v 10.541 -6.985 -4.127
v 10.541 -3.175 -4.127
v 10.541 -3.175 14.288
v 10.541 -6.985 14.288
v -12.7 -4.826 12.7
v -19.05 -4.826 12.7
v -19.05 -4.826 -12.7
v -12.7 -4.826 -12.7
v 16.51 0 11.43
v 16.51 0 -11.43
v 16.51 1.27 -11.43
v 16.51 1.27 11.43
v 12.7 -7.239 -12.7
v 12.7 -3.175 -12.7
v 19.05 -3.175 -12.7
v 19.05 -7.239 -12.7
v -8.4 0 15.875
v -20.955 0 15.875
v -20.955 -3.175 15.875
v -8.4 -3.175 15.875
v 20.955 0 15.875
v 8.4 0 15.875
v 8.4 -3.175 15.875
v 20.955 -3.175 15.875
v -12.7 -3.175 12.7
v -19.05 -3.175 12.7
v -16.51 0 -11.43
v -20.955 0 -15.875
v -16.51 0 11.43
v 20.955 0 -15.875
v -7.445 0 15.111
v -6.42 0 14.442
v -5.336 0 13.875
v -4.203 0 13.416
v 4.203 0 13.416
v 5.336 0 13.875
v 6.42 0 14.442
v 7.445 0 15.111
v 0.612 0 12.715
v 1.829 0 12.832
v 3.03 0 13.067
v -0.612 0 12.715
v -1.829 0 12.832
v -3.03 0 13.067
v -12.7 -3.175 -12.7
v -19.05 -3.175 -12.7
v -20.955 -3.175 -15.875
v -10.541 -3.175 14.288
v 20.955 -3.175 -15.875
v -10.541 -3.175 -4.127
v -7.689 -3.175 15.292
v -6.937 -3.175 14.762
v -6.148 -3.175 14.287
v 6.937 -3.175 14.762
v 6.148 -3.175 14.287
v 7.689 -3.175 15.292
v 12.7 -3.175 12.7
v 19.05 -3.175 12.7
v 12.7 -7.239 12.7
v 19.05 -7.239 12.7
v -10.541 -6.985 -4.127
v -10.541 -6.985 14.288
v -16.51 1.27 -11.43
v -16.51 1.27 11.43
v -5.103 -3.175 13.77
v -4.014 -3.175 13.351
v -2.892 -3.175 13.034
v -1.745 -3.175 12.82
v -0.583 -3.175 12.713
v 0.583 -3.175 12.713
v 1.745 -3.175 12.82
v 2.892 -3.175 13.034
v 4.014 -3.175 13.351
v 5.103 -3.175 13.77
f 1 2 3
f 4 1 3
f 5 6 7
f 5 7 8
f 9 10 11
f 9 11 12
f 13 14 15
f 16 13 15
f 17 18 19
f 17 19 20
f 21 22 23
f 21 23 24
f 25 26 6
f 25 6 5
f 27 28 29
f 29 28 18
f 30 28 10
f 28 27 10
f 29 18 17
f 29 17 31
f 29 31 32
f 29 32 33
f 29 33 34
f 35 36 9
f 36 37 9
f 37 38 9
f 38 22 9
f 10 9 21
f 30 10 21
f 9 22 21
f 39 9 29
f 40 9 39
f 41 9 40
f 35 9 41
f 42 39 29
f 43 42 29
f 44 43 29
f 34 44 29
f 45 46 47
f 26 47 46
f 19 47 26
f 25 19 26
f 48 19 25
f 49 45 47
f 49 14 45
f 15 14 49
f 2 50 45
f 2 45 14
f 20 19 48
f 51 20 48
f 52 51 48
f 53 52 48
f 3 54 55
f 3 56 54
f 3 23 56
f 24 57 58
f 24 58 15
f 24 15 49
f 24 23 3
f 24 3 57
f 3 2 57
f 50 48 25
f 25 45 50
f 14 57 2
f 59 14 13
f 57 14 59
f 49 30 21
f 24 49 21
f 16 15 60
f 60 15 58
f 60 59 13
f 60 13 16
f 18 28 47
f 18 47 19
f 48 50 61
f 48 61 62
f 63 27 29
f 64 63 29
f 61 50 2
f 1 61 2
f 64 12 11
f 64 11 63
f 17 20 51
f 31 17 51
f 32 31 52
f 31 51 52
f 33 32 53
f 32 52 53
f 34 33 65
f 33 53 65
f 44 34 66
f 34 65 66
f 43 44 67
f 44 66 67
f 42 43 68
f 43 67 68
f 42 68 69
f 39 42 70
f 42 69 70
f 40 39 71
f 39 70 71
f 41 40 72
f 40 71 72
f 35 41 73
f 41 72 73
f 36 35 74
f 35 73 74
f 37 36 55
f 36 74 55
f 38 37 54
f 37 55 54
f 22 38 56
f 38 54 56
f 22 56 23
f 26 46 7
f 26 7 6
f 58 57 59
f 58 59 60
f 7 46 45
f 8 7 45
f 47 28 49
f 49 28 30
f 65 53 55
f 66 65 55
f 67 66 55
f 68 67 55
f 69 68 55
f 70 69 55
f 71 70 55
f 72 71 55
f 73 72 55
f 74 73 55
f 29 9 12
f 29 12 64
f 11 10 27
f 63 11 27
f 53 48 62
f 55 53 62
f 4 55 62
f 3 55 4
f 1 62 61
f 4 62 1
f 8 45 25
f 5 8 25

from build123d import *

# Parameters (mm, degrees)
F0_W      = 41.91
F0_H      = 31.75
F1_DEPTH  = 3.175
F4_DEPTH  = 3.176
F5_W      = 21.082
F5_H      = 18.415
F6_DEPTH  = 3.81
F7_W      = 6.35
F7_H      = 25.4
F8_DEPTH  = 4.064
F9_W      = 6.35
F9_H      = 25.4
F10_DEPTH = 1.651
F11_W     = 33.02
F11_H     = 22.86
F12_DEPTH = 1.27


with BuildPart() as f1:
    # F0 (on Front) → F1 (new body)
    with BuildSketch(Plane.XZ):
        Rectangle(F0_W, F0_H)
    extrude(amount=F1_DEPTH)

    # F3 (on face) → F4 (cut, through all)
    with BuildSketch(Plane.XZ.offset(3.175)):
        with BuildLine():
            ThreePointArc((-8.40026, 15.875), (0, 12.7), (8.40026, 15.875))
            Line((8.40026, 15.875), (-8.40026, 15.875))
        make_face()
    extrude(amount=-F4_DEPTH, mode=Mode.SUBTRACT)

    # F5 (on face) → F6 (join)
    with BuildSketch(Plane.XZ.offset(3.175)):
        with Locations((0, 5.08)):
            Rectangle(F5_W, F5_H)
    extrude(amount=F6_DEPTH)

    # F7 (on face) → F8 (join)
    with BuildSketch(Plane.XZ.offset(3.175)):
        with Locations((15.875, 0)):
            Rectangle(F7_W, F7_H)
    extrude(amount=F8_DEPTH)

    # F9 (on face) → F10 (join)
    with BuildSketch(Plane.XZ.offset(3.175)):
        with Locations((-15.875, 0)):
            Rectangle(F9_W, F9_H)
    extrude(amount=F10_DEPTH)

    # F11 (on face) → F12 (join)
    with BuildSketch(Plane(origin=(0, 0, 0), x_dir=(-1, 0, 0), z_dir=(0, 1, 0))):
        Rectangle(F11_W, F11_H)
    extrude(amount=F12_DEPTH)


solid = f1.part
